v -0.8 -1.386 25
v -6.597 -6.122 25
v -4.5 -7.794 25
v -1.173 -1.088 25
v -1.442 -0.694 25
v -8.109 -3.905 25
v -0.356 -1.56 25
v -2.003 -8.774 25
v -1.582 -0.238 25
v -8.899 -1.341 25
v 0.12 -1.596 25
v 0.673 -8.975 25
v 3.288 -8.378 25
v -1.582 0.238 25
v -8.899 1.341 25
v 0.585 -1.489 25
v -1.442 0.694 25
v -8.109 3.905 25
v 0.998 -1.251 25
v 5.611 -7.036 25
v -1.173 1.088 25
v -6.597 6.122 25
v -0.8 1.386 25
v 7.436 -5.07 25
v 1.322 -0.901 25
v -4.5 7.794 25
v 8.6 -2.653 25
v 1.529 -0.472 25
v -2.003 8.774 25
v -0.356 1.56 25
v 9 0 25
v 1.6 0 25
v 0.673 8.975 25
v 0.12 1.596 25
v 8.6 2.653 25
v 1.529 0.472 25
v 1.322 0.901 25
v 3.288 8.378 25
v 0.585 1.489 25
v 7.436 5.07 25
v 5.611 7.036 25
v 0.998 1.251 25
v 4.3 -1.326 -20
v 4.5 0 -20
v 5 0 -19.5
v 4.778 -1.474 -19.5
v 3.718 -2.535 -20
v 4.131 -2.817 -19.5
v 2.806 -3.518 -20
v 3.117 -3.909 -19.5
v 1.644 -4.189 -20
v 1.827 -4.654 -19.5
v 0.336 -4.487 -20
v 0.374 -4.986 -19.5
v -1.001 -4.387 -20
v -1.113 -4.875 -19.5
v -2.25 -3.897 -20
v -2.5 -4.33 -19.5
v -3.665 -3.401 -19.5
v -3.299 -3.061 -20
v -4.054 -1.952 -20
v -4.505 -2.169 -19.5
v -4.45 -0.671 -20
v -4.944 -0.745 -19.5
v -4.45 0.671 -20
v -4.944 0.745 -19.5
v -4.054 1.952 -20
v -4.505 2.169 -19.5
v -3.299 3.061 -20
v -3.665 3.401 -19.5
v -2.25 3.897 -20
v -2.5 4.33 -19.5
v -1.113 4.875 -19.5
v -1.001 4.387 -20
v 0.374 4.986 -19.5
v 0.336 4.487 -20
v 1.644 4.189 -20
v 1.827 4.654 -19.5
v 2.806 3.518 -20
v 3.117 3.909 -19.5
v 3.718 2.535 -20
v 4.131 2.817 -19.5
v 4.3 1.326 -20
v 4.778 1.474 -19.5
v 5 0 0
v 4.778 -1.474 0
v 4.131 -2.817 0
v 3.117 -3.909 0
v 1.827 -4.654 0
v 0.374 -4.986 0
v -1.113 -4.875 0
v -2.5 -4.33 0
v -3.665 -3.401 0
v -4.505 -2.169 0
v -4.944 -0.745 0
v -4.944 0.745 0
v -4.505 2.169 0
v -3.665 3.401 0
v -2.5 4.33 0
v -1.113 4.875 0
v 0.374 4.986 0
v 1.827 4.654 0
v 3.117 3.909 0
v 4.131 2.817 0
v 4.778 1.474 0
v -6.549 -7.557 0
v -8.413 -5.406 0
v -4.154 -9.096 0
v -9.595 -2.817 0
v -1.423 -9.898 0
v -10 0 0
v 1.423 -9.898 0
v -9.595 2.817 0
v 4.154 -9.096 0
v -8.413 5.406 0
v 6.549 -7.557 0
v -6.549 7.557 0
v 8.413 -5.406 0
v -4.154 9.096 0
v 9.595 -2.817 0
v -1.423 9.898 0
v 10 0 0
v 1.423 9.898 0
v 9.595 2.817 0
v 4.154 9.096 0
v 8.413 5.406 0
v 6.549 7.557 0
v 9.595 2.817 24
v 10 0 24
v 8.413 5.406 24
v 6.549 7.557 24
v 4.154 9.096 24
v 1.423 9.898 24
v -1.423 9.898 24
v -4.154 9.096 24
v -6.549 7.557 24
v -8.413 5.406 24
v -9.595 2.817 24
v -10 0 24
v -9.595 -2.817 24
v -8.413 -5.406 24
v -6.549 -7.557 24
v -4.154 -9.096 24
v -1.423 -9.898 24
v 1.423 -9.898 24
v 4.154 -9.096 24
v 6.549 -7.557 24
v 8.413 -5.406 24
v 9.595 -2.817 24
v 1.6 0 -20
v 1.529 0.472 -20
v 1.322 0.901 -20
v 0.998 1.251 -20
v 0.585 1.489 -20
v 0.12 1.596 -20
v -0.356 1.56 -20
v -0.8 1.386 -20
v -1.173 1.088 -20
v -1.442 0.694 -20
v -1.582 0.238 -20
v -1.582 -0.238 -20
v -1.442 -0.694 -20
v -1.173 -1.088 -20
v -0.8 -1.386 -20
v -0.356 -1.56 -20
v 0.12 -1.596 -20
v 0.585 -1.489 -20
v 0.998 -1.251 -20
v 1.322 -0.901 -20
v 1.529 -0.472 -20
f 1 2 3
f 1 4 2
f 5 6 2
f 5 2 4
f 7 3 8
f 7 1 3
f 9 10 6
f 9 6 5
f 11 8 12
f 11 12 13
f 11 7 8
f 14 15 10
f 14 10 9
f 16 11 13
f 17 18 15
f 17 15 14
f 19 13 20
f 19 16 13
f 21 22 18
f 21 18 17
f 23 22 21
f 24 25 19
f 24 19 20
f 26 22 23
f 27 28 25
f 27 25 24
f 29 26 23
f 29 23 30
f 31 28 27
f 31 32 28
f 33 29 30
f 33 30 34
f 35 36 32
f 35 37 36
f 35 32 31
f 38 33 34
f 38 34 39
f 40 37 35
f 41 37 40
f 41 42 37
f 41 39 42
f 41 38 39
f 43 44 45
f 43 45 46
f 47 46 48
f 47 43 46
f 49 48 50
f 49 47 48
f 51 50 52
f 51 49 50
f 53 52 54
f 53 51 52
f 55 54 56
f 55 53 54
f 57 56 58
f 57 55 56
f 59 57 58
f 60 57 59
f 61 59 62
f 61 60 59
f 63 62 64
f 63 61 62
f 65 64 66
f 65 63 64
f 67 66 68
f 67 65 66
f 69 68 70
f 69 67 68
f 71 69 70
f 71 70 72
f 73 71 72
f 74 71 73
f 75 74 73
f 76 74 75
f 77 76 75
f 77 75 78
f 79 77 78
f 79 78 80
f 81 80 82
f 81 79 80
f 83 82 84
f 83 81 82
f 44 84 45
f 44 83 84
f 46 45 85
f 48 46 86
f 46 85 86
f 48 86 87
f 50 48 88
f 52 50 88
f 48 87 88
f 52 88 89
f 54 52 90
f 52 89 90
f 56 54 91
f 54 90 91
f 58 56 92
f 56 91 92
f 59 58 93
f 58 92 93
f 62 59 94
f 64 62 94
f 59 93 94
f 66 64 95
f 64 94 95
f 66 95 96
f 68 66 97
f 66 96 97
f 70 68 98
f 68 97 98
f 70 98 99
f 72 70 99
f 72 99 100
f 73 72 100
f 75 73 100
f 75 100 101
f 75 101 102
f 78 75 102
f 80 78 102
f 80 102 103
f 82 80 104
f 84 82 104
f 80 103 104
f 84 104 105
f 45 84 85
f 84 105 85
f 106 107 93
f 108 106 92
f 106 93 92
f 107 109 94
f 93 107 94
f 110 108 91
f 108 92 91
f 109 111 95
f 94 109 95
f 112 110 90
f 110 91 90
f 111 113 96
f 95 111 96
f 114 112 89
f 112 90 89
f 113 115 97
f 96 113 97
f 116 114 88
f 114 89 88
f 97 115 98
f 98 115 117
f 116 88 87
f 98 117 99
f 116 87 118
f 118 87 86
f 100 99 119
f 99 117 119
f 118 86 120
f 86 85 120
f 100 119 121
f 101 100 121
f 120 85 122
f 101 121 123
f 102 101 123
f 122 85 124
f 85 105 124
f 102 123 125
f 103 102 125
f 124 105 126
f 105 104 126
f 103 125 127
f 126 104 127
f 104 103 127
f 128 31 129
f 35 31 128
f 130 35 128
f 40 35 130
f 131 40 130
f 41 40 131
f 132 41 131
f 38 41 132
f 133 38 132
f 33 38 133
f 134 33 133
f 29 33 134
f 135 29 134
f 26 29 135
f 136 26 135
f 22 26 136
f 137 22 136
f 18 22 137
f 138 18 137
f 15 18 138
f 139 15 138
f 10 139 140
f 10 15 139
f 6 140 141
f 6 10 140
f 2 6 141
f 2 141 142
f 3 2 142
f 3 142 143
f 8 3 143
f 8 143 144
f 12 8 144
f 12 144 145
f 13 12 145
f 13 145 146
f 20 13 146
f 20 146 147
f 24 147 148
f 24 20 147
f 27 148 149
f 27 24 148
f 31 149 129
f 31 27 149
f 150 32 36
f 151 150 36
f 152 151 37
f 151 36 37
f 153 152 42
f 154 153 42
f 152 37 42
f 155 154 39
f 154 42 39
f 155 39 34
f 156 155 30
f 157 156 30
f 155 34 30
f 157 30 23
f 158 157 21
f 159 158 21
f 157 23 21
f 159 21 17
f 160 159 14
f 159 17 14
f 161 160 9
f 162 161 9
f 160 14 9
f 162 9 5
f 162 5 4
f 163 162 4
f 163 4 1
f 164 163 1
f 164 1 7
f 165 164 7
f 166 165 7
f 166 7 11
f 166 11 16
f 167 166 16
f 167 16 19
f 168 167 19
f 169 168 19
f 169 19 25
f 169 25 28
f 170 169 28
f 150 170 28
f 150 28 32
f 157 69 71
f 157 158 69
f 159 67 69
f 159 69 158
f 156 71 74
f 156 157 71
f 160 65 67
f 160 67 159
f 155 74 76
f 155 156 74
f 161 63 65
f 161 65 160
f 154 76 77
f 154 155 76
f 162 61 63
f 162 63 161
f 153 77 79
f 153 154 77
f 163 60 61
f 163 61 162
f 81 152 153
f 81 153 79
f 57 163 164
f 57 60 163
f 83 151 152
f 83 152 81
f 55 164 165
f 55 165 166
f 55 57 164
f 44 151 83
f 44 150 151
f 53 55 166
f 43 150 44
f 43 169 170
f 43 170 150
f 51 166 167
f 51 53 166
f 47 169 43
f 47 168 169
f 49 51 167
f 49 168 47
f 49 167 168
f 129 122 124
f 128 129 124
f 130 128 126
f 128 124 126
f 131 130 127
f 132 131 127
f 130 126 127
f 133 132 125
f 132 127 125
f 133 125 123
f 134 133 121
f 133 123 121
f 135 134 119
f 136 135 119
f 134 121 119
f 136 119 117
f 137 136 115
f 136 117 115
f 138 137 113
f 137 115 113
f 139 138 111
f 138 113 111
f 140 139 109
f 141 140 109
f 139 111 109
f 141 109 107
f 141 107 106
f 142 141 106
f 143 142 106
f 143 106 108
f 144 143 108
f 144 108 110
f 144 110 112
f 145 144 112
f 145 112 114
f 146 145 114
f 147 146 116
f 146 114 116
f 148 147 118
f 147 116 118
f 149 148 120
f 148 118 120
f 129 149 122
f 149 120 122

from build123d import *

# Parameters (mm, degrees)
F0_R     = 10
F1_DEPTH = 25
F2_SIZE  = 1
F3_R     = 5
F4_DEPTH = 20
F5_SIZE  = 0.5
F6_R     = 1.6
F7_DEPTH = 45.001


with BuildPart() as f1:
    # F0 (on Top) → F1 (new body)
    with BuildSketch(Plane.XY):
        Circle(F0_R)
    extrude(amount=F1_DEPTH)

    # F2
    f2_edges = [f1.edges().sort_by_distance(p)[0] for p in [
        (-10, 0, 25),
    ]]
    chamfer(f2_edges, length=F2_SIZE)

    # F3 (on face) → F4 (join)
    with BuildSketch(Plane(origin=(0, 0, 0), x_dir=(1, 0, 0), z_dir=(0, 0, -1))):
        Circle(F3_R)
    extrude(amount=F4_DEPTH)

    # F5
    f5_edges = [f1.edges().sort_by_distance(p)[0] for p in [
        (-5, 0, -20),
    ]]
    chamfer(f5_edges, length=F5_SIZE)

    # F6 (on face) → F7 (cut, through all)
    with BuildSketch(Plane.XY.offset(25)):
        Circle(F6_R)
    extrude(amount=-F7_DEPTH, mode=Mode.SUBTRACT)


solid = f1.part
